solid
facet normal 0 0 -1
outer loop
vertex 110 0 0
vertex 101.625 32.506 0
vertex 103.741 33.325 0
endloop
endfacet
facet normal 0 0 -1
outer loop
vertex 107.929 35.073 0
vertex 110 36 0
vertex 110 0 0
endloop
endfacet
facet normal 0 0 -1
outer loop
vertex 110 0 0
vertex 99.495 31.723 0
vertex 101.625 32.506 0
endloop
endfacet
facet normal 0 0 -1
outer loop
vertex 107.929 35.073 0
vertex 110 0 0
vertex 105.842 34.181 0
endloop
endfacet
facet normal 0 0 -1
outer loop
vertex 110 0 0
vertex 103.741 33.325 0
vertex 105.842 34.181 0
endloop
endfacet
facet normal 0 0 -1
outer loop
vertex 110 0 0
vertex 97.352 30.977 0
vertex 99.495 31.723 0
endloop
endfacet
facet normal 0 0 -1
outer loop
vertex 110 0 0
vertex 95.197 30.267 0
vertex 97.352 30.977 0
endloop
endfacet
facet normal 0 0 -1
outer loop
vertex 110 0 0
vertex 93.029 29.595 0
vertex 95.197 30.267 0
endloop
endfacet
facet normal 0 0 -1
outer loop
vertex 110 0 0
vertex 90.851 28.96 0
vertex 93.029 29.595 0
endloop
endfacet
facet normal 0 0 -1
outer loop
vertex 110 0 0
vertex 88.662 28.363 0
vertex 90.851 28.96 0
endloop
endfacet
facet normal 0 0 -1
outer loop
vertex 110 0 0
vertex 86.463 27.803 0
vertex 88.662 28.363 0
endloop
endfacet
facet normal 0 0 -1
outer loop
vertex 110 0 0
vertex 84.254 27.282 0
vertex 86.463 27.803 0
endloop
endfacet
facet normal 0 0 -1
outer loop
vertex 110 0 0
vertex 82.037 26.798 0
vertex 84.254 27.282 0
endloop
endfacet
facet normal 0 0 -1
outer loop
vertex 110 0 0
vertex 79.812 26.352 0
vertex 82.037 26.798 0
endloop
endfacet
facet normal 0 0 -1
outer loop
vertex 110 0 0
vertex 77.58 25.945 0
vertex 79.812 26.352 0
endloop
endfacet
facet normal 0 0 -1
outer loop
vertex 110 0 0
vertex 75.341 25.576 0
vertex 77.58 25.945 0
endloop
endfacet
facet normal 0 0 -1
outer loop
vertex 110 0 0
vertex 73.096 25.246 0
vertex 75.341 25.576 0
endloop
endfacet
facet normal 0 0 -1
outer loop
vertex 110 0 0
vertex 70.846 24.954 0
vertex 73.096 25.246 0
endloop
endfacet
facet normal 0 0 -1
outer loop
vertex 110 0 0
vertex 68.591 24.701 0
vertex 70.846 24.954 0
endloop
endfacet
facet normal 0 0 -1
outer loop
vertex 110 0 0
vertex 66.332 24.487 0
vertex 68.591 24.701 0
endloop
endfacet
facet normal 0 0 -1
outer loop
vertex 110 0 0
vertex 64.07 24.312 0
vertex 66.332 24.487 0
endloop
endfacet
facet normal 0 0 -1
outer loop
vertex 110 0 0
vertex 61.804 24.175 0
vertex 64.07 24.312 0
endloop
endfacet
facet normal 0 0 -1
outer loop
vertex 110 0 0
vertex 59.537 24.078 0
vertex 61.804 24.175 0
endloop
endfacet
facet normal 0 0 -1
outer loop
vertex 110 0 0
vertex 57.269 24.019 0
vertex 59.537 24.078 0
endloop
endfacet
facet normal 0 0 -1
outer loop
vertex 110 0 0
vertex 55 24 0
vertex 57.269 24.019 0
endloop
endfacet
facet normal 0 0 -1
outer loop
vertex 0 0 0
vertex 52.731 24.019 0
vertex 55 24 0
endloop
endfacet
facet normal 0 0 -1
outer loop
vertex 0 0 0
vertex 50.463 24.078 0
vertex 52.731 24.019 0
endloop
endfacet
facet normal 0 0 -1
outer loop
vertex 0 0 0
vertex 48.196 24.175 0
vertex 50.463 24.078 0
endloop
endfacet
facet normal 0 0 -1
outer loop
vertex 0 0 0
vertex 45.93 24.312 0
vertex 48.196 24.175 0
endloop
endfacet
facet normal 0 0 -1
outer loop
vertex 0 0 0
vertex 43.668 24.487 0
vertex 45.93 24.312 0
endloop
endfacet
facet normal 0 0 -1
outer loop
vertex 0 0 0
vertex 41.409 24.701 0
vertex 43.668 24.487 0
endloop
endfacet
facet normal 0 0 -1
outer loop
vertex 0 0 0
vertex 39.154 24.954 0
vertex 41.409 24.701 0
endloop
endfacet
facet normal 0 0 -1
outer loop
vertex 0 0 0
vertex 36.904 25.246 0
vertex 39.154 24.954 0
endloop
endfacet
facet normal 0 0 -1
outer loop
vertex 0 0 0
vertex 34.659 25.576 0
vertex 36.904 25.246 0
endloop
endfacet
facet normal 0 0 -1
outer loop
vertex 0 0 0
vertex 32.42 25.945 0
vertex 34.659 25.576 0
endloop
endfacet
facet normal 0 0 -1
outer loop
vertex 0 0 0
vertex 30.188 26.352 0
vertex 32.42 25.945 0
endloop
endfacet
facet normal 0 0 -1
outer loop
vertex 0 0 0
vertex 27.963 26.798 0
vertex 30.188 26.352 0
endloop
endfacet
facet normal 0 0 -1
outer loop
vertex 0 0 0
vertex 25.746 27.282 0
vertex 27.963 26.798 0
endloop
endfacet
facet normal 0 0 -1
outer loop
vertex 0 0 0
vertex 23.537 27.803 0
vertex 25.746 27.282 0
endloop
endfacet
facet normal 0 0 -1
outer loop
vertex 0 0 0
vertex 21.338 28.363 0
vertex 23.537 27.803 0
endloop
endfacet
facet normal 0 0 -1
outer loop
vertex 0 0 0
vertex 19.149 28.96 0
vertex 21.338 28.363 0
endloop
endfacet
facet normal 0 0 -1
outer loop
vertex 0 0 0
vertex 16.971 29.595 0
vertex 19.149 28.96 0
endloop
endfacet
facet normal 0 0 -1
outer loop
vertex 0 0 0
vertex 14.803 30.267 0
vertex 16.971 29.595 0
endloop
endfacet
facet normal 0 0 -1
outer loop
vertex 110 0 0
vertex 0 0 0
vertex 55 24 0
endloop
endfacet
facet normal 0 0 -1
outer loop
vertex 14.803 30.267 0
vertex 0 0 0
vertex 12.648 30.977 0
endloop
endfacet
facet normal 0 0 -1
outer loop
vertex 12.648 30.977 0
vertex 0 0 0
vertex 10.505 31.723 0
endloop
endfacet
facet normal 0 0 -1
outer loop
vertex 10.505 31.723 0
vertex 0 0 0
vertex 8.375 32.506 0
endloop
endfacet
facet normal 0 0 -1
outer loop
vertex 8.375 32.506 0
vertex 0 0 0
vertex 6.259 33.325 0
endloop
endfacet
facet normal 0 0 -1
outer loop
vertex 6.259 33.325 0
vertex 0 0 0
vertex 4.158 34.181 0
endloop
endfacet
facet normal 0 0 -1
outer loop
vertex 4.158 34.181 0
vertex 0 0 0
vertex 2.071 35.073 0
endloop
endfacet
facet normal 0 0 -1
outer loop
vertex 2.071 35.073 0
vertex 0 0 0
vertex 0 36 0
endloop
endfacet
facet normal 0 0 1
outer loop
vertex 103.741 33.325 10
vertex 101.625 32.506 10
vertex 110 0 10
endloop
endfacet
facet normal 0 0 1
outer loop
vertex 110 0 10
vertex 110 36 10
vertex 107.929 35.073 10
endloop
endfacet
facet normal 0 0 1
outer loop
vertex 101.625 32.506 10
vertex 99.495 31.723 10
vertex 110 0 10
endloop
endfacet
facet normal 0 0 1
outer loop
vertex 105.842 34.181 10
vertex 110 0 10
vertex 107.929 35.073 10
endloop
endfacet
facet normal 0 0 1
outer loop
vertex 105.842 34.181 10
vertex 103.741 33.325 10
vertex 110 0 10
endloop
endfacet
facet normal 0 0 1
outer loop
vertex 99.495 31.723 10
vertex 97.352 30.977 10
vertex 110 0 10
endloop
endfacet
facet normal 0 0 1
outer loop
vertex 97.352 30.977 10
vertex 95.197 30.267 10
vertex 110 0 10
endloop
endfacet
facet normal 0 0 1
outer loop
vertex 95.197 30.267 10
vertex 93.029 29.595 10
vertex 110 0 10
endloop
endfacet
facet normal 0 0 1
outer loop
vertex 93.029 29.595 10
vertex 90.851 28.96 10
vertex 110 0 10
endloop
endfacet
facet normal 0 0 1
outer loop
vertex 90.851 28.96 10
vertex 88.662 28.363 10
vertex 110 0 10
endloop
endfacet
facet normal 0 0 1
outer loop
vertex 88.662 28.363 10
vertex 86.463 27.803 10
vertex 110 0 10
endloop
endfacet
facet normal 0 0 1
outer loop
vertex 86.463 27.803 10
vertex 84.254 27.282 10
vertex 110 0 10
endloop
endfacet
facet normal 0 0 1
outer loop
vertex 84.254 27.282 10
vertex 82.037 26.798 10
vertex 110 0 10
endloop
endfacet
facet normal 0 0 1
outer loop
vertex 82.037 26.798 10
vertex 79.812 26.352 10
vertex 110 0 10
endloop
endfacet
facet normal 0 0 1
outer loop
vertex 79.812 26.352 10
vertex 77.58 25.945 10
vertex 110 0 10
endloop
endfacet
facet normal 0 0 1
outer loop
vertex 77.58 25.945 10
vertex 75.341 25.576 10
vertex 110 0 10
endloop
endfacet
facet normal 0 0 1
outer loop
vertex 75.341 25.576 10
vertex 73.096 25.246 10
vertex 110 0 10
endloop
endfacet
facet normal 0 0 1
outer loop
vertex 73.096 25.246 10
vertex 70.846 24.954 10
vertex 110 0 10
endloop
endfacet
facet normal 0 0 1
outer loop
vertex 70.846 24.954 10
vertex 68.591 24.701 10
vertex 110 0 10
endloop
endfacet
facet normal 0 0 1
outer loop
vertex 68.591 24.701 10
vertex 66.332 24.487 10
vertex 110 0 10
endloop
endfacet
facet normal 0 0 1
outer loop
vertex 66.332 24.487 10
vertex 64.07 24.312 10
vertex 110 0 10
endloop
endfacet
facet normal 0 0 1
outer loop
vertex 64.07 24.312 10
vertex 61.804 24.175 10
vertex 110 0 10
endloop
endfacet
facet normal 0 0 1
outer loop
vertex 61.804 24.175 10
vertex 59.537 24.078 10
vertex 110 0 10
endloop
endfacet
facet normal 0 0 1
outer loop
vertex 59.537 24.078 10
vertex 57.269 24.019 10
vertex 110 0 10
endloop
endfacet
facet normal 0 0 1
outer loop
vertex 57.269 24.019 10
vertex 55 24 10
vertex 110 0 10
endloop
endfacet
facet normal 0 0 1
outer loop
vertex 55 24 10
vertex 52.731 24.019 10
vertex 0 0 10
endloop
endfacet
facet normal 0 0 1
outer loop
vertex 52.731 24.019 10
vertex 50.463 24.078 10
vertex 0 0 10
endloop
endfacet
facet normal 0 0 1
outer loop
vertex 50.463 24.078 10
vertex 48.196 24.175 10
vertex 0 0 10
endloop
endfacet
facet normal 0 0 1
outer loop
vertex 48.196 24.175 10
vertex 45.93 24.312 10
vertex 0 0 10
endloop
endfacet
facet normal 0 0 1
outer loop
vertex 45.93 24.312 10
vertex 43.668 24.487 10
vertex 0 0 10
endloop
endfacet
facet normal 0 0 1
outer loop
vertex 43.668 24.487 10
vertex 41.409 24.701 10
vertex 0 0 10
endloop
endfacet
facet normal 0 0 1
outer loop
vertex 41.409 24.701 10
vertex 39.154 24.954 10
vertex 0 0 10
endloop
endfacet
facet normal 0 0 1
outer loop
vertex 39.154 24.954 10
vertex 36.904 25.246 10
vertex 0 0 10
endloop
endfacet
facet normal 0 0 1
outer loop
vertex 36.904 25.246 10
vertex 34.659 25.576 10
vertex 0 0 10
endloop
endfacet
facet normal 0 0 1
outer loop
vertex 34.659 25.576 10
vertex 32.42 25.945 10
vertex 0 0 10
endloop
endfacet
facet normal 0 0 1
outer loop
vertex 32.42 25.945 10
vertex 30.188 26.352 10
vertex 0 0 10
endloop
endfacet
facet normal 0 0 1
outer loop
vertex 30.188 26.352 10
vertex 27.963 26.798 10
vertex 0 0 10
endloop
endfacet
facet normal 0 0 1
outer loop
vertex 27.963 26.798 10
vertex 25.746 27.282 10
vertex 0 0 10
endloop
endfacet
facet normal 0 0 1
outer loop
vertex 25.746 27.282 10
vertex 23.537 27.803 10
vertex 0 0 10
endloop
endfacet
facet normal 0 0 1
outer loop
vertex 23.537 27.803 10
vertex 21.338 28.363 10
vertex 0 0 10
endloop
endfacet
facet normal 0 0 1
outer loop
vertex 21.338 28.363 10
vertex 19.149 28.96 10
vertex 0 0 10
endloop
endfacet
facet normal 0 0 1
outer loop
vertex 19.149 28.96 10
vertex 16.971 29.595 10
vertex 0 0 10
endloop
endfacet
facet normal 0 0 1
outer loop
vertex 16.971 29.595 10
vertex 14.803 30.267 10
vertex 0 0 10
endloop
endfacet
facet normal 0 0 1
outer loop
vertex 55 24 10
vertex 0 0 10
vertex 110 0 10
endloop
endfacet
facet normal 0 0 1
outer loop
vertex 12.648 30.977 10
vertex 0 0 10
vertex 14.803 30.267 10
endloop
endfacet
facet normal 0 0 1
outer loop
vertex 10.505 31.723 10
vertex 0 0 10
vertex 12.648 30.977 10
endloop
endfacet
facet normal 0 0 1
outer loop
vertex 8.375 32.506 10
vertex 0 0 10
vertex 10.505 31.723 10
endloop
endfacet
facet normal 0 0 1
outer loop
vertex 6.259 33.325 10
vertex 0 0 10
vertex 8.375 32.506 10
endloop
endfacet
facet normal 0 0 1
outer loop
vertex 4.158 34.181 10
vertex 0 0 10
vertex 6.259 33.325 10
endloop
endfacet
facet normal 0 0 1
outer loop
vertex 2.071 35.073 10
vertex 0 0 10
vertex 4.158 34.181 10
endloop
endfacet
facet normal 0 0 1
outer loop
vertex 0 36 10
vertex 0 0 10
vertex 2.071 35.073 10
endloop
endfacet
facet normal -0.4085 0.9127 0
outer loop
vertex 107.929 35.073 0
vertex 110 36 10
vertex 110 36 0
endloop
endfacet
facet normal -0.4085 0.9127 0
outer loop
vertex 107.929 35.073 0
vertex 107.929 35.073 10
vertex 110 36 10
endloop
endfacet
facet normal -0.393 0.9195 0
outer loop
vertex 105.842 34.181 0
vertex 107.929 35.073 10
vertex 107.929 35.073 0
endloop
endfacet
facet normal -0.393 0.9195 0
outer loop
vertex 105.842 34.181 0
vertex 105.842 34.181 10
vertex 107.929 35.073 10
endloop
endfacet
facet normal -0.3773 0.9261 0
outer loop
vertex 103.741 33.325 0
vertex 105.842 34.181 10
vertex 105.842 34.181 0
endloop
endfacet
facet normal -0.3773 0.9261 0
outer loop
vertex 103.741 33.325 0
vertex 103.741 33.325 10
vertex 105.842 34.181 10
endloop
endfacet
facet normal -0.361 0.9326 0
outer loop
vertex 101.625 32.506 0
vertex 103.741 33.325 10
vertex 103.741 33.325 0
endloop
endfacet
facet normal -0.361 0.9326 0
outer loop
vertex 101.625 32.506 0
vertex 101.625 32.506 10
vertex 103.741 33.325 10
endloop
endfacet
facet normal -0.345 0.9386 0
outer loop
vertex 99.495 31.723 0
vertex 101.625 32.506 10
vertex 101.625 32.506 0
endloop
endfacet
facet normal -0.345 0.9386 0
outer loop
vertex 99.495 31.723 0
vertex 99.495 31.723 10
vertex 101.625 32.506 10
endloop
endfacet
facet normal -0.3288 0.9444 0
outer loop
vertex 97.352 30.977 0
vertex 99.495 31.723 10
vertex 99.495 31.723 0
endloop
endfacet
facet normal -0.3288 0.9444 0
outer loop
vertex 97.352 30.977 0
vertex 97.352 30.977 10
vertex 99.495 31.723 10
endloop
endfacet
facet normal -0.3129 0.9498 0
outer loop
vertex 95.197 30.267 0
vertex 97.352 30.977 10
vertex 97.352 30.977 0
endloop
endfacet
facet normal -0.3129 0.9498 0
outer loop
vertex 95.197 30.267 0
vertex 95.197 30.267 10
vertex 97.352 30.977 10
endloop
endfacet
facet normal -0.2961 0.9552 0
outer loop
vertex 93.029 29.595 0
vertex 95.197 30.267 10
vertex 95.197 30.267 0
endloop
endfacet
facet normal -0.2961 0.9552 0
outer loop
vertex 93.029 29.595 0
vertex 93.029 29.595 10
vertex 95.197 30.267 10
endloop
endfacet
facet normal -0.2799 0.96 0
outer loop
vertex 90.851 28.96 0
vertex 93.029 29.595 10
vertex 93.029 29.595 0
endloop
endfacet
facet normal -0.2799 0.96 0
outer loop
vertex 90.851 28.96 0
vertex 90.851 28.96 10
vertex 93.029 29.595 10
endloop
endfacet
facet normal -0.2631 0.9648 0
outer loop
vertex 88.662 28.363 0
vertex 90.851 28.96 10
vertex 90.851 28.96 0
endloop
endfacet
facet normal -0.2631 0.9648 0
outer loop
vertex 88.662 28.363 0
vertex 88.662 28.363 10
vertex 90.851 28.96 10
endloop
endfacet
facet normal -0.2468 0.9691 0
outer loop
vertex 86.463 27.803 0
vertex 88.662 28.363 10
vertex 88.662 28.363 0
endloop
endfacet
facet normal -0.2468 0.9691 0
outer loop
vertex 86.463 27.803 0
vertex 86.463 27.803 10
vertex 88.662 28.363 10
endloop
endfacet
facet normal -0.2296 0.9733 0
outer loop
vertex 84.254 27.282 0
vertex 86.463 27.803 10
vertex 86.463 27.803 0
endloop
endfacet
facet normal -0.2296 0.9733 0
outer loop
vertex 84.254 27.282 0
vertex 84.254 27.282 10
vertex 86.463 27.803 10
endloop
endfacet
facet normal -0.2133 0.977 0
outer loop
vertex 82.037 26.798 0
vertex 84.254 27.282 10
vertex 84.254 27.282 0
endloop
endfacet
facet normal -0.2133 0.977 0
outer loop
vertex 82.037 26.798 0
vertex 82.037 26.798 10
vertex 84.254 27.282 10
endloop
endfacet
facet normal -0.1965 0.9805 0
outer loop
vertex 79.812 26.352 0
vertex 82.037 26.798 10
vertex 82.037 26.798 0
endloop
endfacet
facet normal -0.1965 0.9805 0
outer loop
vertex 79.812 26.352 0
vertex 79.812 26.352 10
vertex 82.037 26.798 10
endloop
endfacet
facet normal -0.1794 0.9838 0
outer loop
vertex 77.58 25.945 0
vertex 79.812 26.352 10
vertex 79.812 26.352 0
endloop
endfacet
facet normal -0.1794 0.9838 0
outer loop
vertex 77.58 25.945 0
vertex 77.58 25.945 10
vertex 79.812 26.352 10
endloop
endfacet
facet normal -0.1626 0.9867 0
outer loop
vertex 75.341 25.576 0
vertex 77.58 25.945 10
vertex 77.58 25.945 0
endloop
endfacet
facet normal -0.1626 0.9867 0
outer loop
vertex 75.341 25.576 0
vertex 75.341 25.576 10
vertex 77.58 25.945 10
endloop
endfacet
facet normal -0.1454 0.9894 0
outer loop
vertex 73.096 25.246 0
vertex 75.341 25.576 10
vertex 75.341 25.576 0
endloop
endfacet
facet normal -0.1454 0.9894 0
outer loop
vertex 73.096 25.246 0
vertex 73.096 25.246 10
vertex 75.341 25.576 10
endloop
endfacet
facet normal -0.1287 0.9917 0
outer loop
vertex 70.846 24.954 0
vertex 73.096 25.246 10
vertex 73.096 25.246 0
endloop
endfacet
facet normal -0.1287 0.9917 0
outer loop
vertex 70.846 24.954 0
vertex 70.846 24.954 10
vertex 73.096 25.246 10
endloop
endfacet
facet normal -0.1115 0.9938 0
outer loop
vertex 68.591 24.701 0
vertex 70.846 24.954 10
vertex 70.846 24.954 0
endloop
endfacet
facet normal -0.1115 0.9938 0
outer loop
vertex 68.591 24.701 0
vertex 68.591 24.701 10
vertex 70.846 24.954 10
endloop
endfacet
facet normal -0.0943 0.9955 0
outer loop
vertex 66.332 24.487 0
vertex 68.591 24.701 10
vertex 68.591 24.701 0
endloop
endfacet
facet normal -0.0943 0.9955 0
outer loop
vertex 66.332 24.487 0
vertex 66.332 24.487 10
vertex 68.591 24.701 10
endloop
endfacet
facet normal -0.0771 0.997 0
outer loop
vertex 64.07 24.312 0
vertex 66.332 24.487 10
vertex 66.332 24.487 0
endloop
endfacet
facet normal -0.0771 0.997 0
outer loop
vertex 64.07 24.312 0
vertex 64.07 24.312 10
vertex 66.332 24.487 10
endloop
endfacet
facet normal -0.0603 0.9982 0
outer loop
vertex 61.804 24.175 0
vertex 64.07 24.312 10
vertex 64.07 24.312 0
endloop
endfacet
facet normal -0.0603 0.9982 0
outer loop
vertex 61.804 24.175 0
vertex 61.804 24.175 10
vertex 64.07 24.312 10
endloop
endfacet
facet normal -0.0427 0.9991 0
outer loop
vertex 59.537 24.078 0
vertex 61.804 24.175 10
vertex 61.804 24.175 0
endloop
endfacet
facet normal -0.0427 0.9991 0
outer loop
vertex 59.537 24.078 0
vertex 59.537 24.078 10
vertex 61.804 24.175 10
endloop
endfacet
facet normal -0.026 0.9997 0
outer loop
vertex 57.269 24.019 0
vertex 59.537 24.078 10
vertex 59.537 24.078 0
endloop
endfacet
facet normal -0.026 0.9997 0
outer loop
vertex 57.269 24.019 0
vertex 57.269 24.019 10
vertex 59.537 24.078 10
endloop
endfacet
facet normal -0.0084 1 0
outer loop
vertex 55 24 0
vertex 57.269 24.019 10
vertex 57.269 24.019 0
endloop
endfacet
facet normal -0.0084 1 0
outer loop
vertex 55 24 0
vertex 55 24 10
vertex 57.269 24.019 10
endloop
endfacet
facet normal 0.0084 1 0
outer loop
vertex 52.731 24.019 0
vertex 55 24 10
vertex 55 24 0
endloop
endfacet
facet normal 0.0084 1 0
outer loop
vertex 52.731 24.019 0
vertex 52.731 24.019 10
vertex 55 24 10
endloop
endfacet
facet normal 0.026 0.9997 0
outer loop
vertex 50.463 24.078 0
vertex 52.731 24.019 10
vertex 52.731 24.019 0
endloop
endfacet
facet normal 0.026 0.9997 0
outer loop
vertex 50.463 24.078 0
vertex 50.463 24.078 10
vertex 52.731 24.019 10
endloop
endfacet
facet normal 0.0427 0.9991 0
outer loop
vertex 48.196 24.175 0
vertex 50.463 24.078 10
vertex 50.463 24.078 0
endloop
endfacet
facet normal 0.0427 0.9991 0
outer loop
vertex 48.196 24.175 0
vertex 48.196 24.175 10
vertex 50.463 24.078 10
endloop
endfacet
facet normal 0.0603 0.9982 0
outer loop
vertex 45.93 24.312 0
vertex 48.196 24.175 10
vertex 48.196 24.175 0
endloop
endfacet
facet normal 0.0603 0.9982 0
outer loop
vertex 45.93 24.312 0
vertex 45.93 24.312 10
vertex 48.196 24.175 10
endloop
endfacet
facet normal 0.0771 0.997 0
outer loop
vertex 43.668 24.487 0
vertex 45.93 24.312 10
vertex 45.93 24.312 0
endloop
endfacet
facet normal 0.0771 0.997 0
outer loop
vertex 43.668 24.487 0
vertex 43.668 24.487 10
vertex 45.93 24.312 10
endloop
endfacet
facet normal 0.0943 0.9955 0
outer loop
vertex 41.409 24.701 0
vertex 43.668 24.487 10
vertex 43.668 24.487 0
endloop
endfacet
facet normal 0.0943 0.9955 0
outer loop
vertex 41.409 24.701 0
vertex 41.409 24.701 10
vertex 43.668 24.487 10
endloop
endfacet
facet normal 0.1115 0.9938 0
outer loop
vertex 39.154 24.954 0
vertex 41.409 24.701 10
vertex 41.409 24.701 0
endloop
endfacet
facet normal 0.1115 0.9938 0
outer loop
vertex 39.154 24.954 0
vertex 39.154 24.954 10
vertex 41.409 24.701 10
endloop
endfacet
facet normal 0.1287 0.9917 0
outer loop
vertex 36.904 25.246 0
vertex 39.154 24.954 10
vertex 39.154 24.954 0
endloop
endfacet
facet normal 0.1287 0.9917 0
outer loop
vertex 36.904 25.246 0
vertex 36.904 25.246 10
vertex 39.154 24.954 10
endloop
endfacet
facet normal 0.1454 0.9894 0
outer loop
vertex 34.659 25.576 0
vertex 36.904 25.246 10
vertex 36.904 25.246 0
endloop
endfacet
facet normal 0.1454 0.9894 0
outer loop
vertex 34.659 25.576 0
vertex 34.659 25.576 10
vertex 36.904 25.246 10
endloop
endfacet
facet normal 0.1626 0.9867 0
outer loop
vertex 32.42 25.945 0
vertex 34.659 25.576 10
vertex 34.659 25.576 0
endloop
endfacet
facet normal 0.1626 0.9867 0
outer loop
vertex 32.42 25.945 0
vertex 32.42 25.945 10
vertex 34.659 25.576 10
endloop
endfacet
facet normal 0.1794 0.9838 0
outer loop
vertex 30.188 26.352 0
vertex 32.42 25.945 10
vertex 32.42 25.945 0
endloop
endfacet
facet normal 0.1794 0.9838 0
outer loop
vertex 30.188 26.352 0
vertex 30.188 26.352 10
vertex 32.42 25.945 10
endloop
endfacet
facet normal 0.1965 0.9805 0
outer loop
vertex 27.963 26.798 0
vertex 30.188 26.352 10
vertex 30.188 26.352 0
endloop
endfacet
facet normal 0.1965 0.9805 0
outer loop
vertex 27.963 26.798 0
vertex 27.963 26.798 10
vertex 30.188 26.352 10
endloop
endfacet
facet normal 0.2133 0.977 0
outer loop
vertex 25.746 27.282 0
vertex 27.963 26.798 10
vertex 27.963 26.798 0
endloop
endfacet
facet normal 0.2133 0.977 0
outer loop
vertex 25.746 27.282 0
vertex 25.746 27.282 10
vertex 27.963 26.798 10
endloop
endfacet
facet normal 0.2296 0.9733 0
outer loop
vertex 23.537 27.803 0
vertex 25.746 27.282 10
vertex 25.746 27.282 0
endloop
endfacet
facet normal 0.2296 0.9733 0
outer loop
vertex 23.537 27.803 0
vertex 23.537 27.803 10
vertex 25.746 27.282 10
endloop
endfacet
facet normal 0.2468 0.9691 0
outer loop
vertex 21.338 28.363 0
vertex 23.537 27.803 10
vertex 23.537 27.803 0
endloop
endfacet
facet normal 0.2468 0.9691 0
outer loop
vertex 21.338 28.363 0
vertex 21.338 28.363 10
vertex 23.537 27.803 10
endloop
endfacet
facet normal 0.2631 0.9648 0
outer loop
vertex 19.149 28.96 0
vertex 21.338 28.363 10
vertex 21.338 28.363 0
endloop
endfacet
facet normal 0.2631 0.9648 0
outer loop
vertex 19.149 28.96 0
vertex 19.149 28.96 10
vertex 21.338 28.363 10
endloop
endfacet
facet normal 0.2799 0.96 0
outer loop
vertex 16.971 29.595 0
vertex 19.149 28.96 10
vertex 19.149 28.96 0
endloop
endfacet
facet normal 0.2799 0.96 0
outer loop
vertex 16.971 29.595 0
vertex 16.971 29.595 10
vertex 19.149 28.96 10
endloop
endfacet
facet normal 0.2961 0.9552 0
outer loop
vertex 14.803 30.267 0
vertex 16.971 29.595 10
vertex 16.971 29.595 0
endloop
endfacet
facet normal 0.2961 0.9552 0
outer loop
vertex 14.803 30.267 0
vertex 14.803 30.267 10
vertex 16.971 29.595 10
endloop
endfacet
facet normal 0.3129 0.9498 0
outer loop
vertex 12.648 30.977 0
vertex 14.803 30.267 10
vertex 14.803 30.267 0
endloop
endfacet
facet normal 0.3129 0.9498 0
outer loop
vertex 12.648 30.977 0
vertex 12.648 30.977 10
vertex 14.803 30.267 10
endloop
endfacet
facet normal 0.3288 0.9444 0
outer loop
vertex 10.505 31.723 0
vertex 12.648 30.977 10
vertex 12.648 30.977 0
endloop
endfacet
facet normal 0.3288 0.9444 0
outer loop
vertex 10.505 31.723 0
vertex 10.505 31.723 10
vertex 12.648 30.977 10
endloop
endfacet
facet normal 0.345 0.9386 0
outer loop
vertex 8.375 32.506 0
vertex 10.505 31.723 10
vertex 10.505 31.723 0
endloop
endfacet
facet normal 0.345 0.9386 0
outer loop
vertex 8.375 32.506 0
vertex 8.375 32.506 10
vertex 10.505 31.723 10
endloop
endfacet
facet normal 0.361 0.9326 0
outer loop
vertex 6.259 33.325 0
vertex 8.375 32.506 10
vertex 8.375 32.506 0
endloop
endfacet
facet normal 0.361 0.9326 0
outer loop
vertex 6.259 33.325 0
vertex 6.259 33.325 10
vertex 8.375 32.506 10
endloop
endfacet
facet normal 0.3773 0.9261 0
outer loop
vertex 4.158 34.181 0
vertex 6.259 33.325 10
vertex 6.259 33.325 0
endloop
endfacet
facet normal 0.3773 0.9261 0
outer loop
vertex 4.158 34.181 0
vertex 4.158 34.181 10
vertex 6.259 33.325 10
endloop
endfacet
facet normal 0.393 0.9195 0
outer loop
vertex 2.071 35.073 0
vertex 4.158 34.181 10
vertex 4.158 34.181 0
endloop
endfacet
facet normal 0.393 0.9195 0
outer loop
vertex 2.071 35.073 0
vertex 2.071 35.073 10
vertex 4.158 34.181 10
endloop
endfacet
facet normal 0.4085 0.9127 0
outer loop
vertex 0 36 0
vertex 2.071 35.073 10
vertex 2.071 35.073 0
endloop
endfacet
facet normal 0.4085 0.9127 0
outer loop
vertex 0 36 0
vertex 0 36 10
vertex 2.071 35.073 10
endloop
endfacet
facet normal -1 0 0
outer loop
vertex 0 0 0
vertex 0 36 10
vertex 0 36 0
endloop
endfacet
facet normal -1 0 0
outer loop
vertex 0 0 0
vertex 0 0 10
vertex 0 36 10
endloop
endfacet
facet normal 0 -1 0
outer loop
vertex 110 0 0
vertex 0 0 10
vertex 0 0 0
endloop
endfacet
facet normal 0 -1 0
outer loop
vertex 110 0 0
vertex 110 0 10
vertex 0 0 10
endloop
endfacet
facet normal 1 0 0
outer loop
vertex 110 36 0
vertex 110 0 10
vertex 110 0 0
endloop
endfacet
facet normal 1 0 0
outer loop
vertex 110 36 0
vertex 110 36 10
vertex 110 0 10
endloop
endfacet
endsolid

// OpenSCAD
$fn = 32;

// ----------------------------------------------------------------------
// Arc profile plate: notch, 53 points
// ----------------------------------------------------------------------

// --- parameters (mm) ---
bar_l = 110;              // bar length, X
bar_w = 36;               // bar width, Y
notch_depth = 12;         // depth of the arc notch at mid-span
arc_r = 132.04;           // radius of the notch arc
arc_angle = 49.23;        // notch arc angle, degrees
arc_step = 1;             // sampling step of the notch arc, degrees
plate_t = 10;             // plate thickness, Z

profile = [[0, 0], [110, 0], [110, 36], [107.929, 35.073], [105.842, 34.181], [103.741, 33.325], [101.625, 32.506], [99.495, 31.723], [97.352, 30.977], [95.197, 30.267], [93.029, 29.595], [90.851, 28.96], [88.662, 28.363], [86.463, 27.803], [84.254, 27.282], [82.037, 26.798], [79.812, 26.352], [77.58, 25.945], [75.341, 25.576], [73.096, 25.246], [70.846, 24.954], [68.591, 24.701], [66.332, 24.487], [64.07, 24.312], [61.804, 24.175], [59.537, 24.078], [57.269, 24.019], [55, 24], [52.731, 24.019], [50.463, 24.078], [48.196, 24.175], [45.93, 24.312], [43.668, 24.487], [41.409, 24.701], [39.154, 24.954], [36.904, 25.246], [34.659, 25.576], [32.42, 25.945], [30.188, 26.352], [27.963, 26.798], [25.746, 27.282], [23.537, 27.803], [21.338, 28.363], [19.149, 28.96], [16.971, 29.595], [14.803, 30.267], [12.648, 30.977], [10.505, 31.723], [8.375, 32.506], [6.259, 33.325], [4.158, 34.181], [2.071, 35.073], [0, 36]];  // primary outline, 53 points, counter clockwise

// --- the one profile operation ---
linear_extrude(height = plate_t) polygon(points = profile);
